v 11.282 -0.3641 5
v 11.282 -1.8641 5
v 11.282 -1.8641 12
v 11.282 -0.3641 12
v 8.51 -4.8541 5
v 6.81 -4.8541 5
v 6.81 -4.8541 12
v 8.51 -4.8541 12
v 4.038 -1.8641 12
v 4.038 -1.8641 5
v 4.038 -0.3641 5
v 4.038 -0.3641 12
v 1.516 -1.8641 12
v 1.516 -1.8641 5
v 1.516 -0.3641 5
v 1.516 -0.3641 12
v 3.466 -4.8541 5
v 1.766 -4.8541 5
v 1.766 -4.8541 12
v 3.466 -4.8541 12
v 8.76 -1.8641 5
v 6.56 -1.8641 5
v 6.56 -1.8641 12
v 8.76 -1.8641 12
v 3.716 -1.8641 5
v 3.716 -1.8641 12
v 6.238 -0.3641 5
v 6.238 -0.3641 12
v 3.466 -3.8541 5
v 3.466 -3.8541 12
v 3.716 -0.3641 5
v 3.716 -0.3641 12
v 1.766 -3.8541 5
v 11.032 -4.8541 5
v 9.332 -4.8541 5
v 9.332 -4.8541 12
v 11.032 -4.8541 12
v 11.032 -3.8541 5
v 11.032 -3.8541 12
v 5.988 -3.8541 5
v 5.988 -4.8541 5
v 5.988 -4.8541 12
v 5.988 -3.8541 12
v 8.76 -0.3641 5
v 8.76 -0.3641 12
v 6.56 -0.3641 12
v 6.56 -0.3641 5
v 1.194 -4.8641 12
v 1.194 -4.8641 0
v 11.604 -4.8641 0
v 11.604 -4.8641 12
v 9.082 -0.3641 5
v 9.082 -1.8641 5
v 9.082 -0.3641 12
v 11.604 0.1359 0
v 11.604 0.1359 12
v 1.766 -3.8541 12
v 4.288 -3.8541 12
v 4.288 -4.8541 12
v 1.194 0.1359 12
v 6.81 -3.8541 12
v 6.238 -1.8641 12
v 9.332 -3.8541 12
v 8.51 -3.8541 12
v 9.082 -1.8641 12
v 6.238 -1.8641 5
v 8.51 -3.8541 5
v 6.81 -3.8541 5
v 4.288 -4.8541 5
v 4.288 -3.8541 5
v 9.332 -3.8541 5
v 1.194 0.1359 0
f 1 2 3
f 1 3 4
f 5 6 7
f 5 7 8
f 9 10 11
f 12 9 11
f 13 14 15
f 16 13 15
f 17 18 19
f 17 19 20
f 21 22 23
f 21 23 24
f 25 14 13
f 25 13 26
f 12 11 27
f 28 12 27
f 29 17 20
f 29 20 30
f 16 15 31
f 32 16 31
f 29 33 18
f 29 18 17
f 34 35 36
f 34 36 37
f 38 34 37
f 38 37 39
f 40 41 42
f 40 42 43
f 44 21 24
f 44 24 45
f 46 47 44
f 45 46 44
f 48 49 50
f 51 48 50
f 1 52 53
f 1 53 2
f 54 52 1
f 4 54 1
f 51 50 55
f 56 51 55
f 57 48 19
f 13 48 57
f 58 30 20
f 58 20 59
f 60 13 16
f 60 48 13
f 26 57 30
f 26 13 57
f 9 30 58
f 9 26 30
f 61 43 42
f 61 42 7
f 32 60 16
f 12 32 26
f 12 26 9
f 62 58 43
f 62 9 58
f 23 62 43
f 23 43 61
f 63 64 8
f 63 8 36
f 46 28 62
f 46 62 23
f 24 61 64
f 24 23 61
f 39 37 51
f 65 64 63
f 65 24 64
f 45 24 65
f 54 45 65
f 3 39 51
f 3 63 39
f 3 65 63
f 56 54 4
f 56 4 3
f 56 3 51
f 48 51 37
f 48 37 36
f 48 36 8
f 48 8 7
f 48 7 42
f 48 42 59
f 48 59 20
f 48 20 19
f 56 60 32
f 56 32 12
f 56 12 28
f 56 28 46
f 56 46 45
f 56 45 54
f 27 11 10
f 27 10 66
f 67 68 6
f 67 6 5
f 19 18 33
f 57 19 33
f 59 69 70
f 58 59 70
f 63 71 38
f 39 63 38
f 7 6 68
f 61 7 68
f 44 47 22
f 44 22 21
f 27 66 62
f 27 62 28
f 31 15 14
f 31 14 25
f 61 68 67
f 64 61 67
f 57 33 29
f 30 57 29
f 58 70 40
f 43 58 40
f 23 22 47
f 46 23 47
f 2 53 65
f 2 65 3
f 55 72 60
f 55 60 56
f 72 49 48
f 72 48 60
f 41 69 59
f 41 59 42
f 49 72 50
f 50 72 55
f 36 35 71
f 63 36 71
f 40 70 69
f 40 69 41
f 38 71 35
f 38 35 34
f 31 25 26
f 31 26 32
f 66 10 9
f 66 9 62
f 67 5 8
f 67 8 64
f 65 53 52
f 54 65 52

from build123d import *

# Parameters (mm, degrees)
SKETCH2_W            = 10.41
SKETCH2_H            = 5
SKETCH2_W_2          = 1.7
SKETCH2_H_2          = 1
SKETCH2_W_3          = 2.2
SKETCH2_H_3          = 1.5
BOSS_EXTRUDE1_DEPTH  = 12
SKETCH3_W            = 2.2
SKETCH3_H            = 1.5
SKETCH3_W_2          = 1.7
SKETCH3_H_2          = 1.01
BOSS_EXTRUDE10_DEPTH = 5


with BuildPart() as part:
    # Sketch2 → Boss-Extrude1 (new body)
    with BuildSketch(Plane.XY):
        with Locations((6.39898523, -2.364078969)):
            Rectangle(SKETCH2_W, SKETCH2_H)
        with Locations((10.18198523, -4.354078969)):
            Rectangle(SKETCH2_W_2, SKETCH2_H_2, mode=Mode.SUBTRACT)
        with Locations((2.61598523, -4.354078969)):
            Rectangle(SKETCH2_W_2, SKETCH2_H_2, mode=Mode.SUBTRACT)
        with Locations((10.18198523, -1.114078969)):
            Rectangle(SKETCH2_W_3, SKETCH2_H_3, mode=Mode.SUBTRACT)
        with Locations((2.61598523, -1.114078969)):
            Rectangle(SKETCH2_W_3, SKETCH2_H_3, mode=Mode.SUBTRACT)
        with Locations((7.65998523, -1.114078969)):
            Rectangle(SKETCH2_W_3, SKETCH2_H_3, mode=Mode.SUBTRACT)
        with Locations((5.13798523, -1.114078969)):
            Rectangle(SKETCH2_W_3, SKETCH2_H_3, mode=Mode.SUBTRACT)
        with Locations((5.13798523, -4.354078969)):
            Rectangle(SKETCH2_W_2, SKETCH2_H_2, mode=Mode.SUBTRACT)
        with Locations((7.65998523, -4.354078969)):
            Rectangle(SKETCH2_W_2, SKETCH2_H_2, mode=Mode.SUBTRACT)
    extrude(amount=BOSS_EXTRUDE1_DEPTH)

    # Sketch3 → Boss-Extrude10 (add)
    with BuildSketch(Plane.XY):
        with Locations((10.18198523, -1.114078969)):
            Rectangle(SKETCH3_W, SKETCH3_H)
        with Locations((7.65998523, -1.114078969)):
            Rectangle(SKETCH3_W, SKETCH3_H)
        with Locations((5.13798523, -1.114078969)):
            Rectangle(SKETCH3_W, SKETCH3_H)
        with Locations((2.61598523, -1.114078969)):
            Rectangle(SKETCH3_W, SKETCH3_H)
        with Locations((5.13798523, -4.359078969)):
            Rectangle(SKETCH3_W_2, SKETCH3_H_2)
        with Locations((2.61598523, -4.359078969)):
            Rectangle(SKETCH3_W_2, SKETCH3_H_2)
        with Locations((7.65998523, -4.359078969)):
            Rectangle(SKETCH3_W_2, SKETCH3_H_2)
        with Locations((10.18198523, -4.359078969)):
            Rectangle(SKETCH3_W_2, SKETCH3_H_2)
    extrude(amount=BOSS_EXTRUDE10_DEPTH)


solid = part.part
